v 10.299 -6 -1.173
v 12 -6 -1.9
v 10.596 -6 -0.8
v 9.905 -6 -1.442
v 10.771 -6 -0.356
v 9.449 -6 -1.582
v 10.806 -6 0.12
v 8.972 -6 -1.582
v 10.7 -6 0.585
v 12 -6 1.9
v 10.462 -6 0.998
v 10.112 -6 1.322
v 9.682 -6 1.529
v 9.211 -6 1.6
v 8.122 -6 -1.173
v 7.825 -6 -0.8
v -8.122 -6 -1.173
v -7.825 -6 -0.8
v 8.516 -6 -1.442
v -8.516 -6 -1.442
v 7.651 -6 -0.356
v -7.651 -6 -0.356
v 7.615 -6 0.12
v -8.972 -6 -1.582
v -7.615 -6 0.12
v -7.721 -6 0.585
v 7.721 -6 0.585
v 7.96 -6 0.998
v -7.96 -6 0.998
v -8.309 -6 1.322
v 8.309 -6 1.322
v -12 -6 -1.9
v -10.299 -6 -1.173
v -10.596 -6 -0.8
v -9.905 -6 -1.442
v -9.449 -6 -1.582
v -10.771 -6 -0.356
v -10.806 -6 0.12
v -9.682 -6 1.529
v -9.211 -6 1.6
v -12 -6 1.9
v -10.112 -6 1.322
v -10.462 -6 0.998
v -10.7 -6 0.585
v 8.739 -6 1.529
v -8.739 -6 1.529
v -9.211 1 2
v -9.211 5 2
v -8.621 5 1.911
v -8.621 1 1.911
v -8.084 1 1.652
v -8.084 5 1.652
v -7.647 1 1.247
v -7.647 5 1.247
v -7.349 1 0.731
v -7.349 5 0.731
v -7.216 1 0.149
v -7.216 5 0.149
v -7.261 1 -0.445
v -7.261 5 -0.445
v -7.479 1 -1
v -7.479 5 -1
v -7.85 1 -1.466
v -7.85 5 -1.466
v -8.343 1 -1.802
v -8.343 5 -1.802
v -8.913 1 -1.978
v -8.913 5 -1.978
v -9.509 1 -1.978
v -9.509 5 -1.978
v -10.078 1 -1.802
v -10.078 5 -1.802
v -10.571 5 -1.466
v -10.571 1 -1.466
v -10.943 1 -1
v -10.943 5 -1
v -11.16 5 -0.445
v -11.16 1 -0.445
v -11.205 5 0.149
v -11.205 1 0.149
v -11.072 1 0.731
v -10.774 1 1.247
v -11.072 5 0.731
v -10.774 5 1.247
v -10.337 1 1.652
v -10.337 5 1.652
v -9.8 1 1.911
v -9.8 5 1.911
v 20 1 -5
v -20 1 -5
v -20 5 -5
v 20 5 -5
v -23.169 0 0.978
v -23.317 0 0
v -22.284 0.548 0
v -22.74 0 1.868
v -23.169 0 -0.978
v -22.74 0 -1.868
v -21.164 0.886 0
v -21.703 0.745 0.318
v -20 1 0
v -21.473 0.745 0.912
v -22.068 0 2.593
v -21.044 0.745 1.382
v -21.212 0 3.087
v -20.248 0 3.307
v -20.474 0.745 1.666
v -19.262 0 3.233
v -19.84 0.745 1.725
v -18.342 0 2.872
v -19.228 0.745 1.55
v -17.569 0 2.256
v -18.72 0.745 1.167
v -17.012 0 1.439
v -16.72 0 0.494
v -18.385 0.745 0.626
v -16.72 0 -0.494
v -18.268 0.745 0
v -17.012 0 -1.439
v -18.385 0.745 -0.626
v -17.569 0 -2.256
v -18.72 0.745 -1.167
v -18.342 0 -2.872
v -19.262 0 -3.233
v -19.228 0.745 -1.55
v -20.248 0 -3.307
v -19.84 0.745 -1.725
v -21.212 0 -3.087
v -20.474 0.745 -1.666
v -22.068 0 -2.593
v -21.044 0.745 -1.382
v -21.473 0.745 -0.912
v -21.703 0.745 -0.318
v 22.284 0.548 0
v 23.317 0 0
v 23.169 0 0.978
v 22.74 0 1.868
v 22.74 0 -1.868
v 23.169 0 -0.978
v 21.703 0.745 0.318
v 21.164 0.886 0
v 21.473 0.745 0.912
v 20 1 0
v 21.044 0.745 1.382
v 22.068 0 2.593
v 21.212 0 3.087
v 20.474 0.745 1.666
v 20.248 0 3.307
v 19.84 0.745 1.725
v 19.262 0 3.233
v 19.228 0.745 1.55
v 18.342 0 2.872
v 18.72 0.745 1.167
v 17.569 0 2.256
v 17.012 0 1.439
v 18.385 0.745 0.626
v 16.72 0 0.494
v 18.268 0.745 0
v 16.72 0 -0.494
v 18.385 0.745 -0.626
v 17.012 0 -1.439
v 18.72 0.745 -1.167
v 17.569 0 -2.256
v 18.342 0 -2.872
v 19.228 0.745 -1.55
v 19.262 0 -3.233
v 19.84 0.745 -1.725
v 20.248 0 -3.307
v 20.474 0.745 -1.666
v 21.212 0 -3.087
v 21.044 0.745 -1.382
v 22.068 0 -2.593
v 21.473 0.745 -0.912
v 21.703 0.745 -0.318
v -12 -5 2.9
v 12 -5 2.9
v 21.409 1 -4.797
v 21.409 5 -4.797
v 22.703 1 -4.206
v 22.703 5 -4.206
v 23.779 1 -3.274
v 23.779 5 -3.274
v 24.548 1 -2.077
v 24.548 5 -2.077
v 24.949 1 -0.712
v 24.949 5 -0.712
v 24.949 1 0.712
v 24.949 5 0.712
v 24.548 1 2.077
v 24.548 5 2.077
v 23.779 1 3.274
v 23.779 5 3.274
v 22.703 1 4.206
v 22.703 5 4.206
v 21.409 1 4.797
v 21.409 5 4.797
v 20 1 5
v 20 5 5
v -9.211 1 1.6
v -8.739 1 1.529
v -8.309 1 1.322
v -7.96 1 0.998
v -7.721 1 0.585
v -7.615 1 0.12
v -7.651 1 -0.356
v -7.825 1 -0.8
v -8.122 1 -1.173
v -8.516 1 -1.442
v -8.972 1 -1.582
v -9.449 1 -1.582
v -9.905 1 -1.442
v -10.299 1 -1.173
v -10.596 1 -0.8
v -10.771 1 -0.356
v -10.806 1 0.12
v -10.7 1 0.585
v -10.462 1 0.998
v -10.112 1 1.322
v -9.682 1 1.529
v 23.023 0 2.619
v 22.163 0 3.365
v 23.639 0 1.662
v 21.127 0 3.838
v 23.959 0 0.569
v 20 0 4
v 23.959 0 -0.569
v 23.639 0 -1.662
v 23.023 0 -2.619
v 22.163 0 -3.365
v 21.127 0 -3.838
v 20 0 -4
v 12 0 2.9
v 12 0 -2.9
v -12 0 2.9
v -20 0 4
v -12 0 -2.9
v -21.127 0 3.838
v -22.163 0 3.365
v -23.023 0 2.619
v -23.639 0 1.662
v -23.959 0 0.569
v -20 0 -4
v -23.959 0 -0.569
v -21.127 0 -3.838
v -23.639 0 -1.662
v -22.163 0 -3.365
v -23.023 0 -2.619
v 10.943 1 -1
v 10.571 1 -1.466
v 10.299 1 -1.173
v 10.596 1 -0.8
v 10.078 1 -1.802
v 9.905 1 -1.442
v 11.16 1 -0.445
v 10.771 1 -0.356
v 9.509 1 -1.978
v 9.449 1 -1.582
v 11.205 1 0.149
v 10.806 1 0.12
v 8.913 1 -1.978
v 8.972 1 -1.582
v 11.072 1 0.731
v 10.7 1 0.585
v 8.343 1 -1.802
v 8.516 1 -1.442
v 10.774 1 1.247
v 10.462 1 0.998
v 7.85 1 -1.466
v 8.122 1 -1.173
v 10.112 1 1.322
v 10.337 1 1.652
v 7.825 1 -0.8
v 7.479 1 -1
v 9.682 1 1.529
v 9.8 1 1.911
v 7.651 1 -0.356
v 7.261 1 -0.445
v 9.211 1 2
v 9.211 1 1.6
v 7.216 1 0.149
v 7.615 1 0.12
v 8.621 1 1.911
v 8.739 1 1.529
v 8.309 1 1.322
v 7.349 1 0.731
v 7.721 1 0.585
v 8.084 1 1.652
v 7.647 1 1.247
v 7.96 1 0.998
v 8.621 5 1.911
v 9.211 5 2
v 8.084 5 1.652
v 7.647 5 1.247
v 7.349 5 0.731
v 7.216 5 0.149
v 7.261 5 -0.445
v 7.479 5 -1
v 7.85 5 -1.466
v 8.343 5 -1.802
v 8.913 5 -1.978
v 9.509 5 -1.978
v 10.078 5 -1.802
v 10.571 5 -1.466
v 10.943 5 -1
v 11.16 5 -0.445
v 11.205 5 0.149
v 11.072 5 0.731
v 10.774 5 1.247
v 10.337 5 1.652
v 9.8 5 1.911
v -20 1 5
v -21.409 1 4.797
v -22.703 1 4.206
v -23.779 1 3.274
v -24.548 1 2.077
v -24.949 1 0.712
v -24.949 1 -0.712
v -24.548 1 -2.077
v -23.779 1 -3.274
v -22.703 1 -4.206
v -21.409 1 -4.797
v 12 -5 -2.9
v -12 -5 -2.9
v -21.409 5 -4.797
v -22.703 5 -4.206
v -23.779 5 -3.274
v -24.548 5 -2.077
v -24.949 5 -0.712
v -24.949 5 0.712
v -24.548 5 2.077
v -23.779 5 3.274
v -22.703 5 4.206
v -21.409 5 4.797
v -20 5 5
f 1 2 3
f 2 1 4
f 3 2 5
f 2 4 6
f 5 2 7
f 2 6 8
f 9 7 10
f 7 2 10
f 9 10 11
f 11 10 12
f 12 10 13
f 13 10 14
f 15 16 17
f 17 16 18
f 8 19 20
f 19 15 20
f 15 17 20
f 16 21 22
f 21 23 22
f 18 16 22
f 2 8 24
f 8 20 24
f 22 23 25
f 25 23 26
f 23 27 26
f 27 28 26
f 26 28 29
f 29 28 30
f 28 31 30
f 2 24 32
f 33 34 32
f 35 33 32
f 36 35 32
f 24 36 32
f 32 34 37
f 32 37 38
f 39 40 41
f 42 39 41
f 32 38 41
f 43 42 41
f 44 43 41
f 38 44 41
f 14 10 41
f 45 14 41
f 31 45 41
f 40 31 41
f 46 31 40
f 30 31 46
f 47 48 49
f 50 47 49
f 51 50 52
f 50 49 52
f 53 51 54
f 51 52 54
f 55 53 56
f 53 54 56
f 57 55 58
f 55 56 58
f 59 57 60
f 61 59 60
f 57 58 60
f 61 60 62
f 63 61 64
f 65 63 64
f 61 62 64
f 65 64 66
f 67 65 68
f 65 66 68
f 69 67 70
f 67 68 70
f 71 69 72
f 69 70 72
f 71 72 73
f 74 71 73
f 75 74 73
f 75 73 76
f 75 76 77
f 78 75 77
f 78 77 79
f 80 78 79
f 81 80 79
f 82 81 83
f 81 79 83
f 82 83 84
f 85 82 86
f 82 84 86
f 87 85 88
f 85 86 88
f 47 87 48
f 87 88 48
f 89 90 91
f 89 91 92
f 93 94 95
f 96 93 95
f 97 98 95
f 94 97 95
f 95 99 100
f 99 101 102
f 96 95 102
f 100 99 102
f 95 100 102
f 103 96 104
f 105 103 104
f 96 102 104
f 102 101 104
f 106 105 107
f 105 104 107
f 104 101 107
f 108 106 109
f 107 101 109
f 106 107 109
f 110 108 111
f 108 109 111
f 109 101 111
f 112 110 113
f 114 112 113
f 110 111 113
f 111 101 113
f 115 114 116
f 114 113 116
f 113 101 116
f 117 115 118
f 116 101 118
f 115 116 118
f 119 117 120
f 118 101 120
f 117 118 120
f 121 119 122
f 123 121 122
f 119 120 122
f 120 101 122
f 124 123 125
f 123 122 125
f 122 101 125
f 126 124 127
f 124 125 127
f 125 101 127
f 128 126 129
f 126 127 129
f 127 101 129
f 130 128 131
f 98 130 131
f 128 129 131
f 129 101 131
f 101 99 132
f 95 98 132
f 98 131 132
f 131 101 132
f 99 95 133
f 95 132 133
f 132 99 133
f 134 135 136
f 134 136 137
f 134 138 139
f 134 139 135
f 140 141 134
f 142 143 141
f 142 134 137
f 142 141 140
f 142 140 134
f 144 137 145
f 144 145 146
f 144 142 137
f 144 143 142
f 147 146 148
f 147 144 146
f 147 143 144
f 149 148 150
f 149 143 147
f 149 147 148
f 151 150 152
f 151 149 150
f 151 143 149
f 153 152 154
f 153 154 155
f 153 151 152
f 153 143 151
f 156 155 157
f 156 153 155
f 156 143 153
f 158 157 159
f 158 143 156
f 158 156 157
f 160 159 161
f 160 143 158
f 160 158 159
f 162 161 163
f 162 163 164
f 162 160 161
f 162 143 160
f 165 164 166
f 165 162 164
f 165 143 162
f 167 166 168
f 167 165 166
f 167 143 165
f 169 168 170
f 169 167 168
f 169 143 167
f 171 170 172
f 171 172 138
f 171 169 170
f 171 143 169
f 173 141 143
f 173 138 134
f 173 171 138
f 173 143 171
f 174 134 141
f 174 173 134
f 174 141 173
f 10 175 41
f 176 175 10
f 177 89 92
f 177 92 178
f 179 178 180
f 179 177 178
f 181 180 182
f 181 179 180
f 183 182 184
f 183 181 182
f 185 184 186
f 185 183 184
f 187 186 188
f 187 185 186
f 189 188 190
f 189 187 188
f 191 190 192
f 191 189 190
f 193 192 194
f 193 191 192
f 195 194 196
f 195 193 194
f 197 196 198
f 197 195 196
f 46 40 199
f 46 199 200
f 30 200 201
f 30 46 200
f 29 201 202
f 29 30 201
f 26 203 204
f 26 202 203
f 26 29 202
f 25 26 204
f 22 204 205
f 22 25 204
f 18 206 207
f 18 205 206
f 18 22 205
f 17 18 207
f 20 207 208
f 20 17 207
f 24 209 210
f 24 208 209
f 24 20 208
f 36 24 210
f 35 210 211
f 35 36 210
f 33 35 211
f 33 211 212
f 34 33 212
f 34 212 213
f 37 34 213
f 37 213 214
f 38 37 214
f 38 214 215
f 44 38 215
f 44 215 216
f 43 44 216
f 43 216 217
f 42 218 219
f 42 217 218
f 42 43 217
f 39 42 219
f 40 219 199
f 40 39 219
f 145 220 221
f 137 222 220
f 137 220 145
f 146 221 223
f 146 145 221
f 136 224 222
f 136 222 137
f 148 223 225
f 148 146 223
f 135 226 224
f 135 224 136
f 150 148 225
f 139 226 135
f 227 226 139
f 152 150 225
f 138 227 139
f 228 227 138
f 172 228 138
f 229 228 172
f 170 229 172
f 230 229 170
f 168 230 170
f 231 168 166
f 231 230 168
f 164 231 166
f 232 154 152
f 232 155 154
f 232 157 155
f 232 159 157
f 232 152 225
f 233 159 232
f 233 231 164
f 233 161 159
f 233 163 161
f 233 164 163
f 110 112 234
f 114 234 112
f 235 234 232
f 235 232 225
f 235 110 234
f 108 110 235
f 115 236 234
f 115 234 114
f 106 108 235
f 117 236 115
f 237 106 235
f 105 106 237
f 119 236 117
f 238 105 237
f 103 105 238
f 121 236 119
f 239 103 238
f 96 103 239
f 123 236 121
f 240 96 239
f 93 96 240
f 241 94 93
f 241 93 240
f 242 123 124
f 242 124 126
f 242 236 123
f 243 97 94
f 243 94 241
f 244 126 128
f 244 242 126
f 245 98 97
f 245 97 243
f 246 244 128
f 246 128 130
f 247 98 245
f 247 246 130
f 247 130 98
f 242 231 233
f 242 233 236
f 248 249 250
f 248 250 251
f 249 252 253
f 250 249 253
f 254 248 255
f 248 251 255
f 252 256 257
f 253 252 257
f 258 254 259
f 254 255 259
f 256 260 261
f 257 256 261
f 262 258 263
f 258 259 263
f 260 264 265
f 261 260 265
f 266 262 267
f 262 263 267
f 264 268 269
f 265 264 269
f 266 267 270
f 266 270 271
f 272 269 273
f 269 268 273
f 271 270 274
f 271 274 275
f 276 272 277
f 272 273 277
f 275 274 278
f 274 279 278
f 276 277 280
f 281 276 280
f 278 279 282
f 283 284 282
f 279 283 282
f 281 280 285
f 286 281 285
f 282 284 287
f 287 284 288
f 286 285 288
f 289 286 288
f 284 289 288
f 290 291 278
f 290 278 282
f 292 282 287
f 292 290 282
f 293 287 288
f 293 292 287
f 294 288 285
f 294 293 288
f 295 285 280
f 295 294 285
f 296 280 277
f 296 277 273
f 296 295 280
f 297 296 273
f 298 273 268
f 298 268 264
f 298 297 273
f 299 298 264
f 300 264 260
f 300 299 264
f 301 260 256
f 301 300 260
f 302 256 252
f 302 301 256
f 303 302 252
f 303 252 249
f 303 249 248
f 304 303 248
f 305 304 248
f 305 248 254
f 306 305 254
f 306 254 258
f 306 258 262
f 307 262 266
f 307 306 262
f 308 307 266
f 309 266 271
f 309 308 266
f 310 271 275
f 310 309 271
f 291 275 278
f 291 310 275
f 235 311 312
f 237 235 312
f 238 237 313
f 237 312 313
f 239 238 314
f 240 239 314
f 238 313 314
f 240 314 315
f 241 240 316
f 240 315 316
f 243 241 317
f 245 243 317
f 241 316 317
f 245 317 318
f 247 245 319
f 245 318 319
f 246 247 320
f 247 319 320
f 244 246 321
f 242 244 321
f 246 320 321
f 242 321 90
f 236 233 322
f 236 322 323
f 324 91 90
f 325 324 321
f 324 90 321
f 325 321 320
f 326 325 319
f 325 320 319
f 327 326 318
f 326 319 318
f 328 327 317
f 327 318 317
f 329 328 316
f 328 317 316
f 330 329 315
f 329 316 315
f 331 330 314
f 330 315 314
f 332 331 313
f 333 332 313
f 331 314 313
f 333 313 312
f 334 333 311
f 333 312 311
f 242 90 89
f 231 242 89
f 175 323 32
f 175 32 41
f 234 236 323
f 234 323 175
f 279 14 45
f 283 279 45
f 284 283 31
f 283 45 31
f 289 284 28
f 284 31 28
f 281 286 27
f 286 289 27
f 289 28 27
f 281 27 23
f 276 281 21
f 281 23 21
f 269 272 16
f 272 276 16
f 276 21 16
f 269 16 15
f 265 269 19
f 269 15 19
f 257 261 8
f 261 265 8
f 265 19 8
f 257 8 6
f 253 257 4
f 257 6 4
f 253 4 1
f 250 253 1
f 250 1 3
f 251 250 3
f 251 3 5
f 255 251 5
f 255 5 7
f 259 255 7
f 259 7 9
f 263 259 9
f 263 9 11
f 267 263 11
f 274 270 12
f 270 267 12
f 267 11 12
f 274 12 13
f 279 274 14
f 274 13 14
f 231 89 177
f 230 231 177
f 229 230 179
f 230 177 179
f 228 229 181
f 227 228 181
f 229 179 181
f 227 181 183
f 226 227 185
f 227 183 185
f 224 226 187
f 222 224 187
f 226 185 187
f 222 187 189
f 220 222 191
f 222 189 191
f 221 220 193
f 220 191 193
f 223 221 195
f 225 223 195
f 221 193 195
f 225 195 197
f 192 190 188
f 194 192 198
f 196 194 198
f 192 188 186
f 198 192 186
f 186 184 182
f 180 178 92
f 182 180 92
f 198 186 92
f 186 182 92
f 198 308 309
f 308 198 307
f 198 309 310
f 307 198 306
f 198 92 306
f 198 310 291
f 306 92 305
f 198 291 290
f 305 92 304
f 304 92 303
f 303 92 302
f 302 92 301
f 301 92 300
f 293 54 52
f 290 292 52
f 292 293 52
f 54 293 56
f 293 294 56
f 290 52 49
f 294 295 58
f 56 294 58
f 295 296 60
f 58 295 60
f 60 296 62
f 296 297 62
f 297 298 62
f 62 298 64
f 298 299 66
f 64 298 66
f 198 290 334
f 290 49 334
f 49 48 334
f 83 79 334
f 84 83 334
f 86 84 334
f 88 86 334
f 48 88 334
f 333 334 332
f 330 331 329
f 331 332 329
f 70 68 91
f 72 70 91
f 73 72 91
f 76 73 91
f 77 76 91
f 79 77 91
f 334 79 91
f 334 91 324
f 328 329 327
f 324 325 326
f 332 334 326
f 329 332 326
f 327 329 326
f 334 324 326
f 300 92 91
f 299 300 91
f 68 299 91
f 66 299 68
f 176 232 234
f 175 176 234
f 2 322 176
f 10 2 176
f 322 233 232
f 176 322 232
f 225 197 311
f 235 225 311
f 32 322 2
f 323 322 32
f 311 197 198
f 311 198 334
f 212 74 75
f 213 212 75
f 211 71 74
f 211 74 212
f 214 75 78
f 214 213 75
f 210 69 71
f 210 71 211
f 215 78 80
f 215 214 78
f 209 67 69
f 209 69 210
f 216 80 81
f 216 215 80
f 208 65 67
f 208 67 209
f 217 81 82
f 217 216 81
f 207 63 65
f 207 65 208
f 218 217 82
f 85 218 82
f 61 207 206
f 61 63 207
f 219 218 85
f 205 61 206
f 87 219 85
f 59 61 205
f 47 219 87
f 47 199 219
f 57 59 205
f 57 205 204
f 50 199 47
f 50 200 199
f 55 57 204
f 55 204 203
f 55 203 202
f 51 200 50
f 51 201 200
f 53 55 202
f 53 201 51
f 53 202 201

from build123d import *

# Parameters (mm, degrees)
BOSS_EXTRUDE1_DEPTH     = 5
SKETCH3_W               = 12
SKETCH3_H               = 5.8
BOSS_EXTRUDE2_DEPTH     = 6
CUT_EXTRUDE1_DEPTH      = 27.191601707
CUT_EXTRUDE1_DEPTH_BACK = 27.191601707
SKETCH4_R               = 1.6
SKETCH5_R               = 2
CUT_EXTRUDE2_DEPTH      = 4
CHAMFER2_SIZE           = 1


with BuildPart() as part:
    # Sketch1 → Boss-Extrude1 (new body)
    with BuildSketch(Plane(origin=(0, 0, 0), x_dir=(1, 0, 0), z_dir=(0, 1, 0))):
        with BuildLine():
            Line((0, 5), (-20, 5))
            ThreePointArc((-20, 5), (-25, 0), (-20, -5))
            Line((-20, -5), (0, -5))
            Line((0, -5), (0, 5))
        make_face()
    extrude(amount=BOSS_EXTRUDE1_DEPTH)

    # Sketch2 → Cut-Revolve1 (revolve, cut)
    with BuildSketch(Plane.XY):
        with BuildLine():
            Line((-20, 1), (-20, 0))
            Line((-20, 0), (-23.31662479, 0))
            ThreePointArc((-23.31662479, 0), (-21.732050808, 0.744562647), (-20, 1))
        make_face()
    revolve(axis=Axis((-20, -4.110143275, 0), (0, 1, 0)), mode=Mode.SUBTRACT)

    # Sketch3 → Boss-Extrude2 (add)
    with BuildSketch(Plane.XZ):
        with Locations((-6, 0)):
            Rectangle(SKETCH3_W, SKETCH3_H)
    extrude(amount=BOSS_EXTRUDE2_DEPTH)

    # Sketch4 → Cut-Extrude1 (cut, two sides: drawn at the far end of the back side and taken through both)
    with BuildSketch(Plane(origin=(0, 0, 0), x_dir=(1, 0, 0), z_dir=(0, 1, 0)).offset(-CUT_EXTRUDE1_DEPTH_BACK)):
        with Locations(Location((-9.210618834, 0, 0), (0, 0, 270))):
            Circle(SKETCH4_R)
    extrude(amount=CUT_EXTRUDE1_DEPTH + CUT_EXTRUDE1_DEPTH_BACK, mode=Mode.SUBTRACT)

    # Sketch5 → Cut-Extrude2 (cut)
    with BuildSketch(Plane(origin=(0, 5, 0), x_dir=(1, 0, 0), z_dir=(0, 1, 0))):
        with Locations(Location((-9.210618834, 0, 0), (0, 0, 270))):
            Circle(SKETCH5_R)
    extrude(amount=-CUT_EXTRUDE2_DEPTH, mode=Mode.SUBTRACT)

    # Mirror1: part across plane


with BuildPart() as part_1:
    add(part.part)
    add(part.part.mirror(Plane(origin=(0, 0, 0), x_dir=(0, 0, 1), z_dir=(1, 0, 0))))

    # Chamfer2
    chamfer2_edges = [part_1.edges().sort_by_distance(p)[0] for p in [
        (0, -6, 2.9),
        (0, -6, -2.9),
        (25, 0, 0),
        (0, 0, 5),
        (-25, 0, 0),
        (0, 0, -5),
    ]]
    chamfer(chamfer2_edges, length=CHAMFER2_SIZE)


solid = part_1.part
